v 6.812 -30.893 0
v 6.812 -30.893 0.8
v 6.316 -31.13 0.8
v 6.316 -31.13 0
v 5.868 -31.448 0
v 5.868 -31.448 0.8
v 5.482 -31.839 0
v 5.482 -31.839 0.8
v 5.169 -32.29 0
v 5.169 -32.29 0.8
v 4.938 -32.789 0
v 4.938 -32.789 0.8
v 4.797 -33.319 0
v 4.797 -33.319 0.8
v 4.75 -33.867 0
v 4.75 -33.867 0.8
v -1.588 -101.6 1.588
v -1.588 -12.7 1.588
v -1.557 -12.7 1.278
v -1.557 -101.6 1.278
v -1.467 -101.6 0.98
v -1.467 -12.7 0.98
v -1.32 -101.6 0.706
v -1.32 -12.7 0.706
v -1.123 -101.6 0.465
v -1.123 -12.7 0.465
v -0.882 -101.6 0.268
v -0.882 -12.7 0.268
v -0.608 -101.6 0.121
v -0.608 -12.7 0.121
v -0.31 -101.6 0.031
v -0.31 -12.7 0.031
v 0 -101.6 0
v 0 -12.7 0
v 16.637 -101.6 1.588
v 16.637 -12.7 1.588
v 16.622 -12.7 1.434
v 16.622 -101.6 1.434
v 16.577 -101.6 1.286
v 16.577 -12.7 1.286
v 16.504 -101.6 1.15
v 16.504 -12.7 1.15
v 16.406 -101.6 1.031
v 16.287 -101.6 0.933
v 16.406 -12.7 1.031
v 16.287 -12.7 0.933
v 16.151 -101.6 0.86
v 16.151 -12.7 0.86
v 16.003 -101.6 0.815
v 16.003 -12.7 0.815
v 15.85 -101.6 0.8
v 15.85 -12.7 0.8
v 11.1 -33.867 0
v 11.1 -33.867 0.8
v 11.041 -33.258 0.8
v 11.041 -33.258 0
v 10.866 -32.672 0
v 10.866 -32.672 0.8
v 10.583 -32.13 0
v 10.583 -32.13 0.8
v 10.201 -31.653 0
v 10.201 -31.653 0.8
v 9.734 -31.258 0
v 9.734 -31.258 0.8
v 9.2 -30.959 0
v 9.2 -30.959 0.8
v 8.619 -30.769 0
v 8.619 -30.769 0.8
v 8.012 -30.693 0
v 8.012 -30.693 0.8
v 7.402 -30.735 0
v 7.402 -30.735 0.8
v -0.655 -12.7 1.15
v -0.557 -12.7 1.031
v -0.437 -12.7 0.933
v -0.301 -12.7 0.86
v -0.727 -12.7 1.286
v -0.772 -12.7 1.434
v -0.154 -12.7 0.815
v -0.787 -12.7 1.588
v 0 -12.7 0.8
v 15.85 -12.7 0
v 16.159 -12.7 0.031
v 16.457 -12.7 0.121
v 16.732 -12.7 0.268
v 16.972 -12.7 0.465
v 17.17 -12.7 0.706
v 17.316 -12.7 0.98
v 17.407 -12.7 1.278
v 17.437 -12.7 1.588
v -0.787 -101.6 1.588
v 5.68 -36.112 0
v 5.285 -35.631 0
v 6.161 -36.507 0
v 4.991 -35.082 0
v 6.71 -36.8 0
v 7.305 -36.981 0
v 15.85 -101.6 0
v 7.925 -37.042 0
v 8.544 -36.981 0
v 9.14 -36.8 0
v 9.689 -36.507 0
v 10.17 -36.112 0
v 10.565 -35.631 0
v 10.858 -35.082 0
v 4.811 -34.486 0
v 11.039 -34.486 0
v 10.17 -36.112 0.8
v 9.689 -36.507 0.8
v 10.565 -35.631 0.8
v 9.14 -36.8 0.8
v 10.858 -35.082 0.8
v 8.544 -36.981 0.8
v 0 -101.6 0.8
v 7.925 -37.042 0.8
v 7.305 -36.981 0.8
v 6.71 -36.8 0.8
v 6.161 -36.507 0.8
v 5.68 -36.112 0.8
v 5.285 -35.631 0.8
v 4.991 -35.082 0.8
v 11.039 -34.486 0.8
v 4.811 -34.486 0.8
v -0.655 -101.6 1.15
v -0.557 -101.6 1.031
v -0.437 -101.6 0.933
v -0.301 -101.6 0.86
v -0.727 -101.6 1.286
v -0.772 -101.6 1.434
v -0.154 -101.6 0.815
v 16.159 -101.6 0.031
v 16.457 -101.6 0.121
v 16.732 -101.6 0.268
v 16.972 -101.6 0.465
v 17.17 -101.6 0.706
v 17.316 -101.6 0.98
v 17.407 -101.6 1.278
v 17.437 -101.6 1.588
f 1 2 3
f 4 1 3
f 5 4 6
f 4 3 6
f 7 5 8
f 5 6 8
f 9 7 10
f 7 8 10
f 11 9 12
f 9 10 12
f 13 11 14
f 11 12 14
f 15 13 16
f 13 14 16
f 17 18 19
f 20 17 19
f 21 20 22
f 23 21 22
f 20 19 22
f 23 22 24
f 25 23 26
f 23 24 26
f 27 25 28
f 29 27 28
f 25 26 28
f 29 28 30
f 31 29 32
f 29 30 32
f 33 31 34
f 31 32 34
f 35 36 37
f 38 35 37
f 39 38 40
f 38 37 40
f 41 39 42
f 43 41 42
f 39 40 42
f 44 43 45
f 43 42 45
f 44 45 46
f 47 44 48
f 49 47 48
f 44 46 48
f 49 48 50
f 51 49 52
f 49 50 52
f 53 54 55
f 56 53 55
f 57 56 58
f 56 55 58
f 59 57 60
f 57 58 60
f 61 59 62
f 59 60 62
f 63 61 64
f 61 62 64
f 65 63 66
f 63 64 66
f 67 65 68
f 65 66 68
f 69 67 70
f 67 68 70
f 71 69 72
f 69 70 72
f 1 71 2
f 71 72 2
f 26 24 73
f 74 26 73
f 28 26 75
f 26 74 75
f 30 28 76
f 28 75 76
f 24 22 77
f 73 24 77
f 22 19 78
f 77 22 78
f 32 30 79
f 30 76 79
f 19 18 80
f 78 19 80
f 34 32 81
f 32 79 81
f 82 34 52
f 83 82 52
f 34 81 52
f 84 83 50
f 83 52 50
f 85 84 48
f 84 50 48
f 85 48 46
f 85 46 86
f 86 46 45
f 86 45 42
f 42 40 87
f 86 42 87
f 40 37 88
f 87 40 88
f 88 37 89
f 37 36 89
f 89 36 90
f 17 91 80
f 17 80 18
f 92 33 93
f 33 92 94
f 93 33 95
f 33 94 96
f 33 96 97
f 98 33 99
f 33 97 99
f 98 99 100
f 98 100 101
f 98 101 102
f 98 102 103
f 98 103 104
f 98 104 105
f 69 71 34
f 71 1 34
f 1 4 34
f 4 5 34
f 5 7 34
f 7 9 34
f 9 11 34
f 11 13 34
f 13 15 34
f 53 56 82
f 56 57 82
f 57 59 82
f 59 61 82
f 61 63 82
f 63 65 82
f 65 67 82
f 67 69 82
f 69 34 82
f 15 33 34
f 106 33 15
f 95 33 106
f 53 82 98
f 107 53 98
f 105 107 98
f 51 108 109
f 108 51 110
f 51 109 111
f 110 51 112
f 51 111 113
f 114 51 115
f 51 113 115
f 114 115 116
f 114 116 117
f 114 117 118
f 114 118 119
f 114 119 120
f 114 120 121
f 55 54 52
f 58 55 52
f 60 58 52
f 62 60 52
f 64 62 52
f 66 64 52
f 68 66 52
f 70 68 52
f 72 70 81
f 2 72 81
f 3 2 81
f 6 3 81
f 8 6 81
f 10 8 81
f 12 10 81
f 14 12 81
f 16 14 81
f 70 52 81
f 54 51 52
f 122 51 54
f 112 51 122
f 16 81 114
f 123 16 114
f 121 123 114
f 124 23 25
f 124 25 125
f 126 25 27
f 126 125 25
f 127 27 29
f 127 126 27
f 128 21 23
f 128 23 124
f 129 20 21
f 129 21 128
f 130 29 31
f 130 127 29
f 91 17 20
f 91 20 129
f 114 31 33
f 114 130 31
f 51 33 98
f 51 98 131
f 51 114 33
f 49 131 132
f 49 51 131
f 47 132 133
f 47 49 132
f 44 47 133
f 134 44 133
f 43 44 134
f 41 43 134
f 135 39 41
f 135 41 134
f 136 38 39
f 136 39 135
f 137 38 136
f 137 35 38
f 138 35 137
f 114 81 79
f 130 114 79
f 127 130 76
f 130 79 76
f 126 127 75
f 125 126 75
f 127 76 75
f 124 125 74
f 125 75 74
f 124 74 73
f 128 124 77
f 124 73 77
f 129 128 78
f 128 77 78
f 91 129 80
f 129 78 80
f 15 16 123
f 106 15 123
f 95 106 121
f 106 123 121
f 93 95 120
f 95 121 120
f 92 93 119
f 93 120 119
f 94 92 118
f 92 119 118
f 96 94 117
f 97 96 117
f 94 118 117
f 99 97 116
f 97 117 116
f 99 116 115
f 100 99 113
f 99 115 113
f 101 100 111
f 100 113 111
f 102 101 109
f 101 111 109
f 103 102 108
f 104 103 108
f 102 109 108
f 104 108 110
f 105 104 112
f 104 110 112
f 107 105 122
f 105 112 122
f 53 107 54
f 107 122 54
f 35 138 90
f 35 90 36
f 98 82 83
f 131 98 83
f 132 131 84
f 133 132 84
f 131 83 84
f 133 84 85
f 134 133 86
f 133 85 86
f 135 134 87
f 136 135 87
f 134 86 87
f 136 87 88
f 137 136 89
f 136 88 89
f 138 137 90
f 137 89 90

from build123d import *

# Parameters (mm, degrees)
F1_START = 12.7
F1_DEPTH = 88.9
F3_DEPTH = 0.8001


# Not quite as in the source:
# - a feature names something its author has since deleted; it is built from what else it names


with BuildPart() as f1:
    # F0 (on Front) → F1 (new body)
    with BuildSketch(Plane.XZ.offset(F1_START)):
        with BuildLine():
            ThreePointArc((-1.5875, 1.5875), (-1.1225320151, 0.4649679849), (0, 0))
            Line((0, 0), (15.8496, 0))
            ThreePointArc((15.8496, 0), (16.9721320151, 0.4649679849), (17.4371, 1.5875))
            Line((17.4371, 1.5875), (16.637, 1.5875))
            ThreePointArc((16.637, 1.5875), (16.4063758795, 1.0307241205), (15.8496, 0.8001))
            Line((15.8496, 0.8001), (7.9248, 0.8001))
            Line((7.9248, 0.8001), (0, 0.8001))
            ThreePointArc((0, 0.8001), (-0.5567758795, 1.0307241205), (-0.7874, 1.5875))
            Line((-0.7874, 1.5875), (-1.5875, 1.5875))
        make_face()
    extrude(amount=F1_DEPTH)

    # F2 (on face) → F3 (cut, through all)
    with BuildSketch(Plane.XY.offset(0.8001)):
        with BuildLine():
            Line((4.7498, -33.8666666667), (7.9248, -33.8666666667))
            Line((7.9248, -33.8666666667), (6.8115473336, -30.8932353995))
            ThreePointArc((6.8115473336, -30.8932353995), (5.3156619991, -32.0575166198), (4.7498, -33.8666666667))
        make_face()
        with BuildLine():
            Line((7.9248, -33.8666666667), (11.0998, -33.8666666667))
            ThreePointArc((11.0998, -33.8666666667), (9.7339500469, -31.2575286657), (6.8115473336, -30.8932353995))
            Line((6.8115473336, -30.8932353995), (7.9248, -33.8666666667))
        make_face()
        with BuildLine():
            ThreePointArc((4.7498, -33.8666666667), (7.9248, -37.0416666667), (11.0998, -33.8666666667))
            Line((11.0998, -33.8666666667), (7.9248, -33.8666666667))
            Line((7.9248, -33.8666666667), (4.7498, -33.8666666667))
        make_face()
    extrude(amount=-F3_DEPTH, mode=Mode.SUBTRACT)


solid = f1.part
